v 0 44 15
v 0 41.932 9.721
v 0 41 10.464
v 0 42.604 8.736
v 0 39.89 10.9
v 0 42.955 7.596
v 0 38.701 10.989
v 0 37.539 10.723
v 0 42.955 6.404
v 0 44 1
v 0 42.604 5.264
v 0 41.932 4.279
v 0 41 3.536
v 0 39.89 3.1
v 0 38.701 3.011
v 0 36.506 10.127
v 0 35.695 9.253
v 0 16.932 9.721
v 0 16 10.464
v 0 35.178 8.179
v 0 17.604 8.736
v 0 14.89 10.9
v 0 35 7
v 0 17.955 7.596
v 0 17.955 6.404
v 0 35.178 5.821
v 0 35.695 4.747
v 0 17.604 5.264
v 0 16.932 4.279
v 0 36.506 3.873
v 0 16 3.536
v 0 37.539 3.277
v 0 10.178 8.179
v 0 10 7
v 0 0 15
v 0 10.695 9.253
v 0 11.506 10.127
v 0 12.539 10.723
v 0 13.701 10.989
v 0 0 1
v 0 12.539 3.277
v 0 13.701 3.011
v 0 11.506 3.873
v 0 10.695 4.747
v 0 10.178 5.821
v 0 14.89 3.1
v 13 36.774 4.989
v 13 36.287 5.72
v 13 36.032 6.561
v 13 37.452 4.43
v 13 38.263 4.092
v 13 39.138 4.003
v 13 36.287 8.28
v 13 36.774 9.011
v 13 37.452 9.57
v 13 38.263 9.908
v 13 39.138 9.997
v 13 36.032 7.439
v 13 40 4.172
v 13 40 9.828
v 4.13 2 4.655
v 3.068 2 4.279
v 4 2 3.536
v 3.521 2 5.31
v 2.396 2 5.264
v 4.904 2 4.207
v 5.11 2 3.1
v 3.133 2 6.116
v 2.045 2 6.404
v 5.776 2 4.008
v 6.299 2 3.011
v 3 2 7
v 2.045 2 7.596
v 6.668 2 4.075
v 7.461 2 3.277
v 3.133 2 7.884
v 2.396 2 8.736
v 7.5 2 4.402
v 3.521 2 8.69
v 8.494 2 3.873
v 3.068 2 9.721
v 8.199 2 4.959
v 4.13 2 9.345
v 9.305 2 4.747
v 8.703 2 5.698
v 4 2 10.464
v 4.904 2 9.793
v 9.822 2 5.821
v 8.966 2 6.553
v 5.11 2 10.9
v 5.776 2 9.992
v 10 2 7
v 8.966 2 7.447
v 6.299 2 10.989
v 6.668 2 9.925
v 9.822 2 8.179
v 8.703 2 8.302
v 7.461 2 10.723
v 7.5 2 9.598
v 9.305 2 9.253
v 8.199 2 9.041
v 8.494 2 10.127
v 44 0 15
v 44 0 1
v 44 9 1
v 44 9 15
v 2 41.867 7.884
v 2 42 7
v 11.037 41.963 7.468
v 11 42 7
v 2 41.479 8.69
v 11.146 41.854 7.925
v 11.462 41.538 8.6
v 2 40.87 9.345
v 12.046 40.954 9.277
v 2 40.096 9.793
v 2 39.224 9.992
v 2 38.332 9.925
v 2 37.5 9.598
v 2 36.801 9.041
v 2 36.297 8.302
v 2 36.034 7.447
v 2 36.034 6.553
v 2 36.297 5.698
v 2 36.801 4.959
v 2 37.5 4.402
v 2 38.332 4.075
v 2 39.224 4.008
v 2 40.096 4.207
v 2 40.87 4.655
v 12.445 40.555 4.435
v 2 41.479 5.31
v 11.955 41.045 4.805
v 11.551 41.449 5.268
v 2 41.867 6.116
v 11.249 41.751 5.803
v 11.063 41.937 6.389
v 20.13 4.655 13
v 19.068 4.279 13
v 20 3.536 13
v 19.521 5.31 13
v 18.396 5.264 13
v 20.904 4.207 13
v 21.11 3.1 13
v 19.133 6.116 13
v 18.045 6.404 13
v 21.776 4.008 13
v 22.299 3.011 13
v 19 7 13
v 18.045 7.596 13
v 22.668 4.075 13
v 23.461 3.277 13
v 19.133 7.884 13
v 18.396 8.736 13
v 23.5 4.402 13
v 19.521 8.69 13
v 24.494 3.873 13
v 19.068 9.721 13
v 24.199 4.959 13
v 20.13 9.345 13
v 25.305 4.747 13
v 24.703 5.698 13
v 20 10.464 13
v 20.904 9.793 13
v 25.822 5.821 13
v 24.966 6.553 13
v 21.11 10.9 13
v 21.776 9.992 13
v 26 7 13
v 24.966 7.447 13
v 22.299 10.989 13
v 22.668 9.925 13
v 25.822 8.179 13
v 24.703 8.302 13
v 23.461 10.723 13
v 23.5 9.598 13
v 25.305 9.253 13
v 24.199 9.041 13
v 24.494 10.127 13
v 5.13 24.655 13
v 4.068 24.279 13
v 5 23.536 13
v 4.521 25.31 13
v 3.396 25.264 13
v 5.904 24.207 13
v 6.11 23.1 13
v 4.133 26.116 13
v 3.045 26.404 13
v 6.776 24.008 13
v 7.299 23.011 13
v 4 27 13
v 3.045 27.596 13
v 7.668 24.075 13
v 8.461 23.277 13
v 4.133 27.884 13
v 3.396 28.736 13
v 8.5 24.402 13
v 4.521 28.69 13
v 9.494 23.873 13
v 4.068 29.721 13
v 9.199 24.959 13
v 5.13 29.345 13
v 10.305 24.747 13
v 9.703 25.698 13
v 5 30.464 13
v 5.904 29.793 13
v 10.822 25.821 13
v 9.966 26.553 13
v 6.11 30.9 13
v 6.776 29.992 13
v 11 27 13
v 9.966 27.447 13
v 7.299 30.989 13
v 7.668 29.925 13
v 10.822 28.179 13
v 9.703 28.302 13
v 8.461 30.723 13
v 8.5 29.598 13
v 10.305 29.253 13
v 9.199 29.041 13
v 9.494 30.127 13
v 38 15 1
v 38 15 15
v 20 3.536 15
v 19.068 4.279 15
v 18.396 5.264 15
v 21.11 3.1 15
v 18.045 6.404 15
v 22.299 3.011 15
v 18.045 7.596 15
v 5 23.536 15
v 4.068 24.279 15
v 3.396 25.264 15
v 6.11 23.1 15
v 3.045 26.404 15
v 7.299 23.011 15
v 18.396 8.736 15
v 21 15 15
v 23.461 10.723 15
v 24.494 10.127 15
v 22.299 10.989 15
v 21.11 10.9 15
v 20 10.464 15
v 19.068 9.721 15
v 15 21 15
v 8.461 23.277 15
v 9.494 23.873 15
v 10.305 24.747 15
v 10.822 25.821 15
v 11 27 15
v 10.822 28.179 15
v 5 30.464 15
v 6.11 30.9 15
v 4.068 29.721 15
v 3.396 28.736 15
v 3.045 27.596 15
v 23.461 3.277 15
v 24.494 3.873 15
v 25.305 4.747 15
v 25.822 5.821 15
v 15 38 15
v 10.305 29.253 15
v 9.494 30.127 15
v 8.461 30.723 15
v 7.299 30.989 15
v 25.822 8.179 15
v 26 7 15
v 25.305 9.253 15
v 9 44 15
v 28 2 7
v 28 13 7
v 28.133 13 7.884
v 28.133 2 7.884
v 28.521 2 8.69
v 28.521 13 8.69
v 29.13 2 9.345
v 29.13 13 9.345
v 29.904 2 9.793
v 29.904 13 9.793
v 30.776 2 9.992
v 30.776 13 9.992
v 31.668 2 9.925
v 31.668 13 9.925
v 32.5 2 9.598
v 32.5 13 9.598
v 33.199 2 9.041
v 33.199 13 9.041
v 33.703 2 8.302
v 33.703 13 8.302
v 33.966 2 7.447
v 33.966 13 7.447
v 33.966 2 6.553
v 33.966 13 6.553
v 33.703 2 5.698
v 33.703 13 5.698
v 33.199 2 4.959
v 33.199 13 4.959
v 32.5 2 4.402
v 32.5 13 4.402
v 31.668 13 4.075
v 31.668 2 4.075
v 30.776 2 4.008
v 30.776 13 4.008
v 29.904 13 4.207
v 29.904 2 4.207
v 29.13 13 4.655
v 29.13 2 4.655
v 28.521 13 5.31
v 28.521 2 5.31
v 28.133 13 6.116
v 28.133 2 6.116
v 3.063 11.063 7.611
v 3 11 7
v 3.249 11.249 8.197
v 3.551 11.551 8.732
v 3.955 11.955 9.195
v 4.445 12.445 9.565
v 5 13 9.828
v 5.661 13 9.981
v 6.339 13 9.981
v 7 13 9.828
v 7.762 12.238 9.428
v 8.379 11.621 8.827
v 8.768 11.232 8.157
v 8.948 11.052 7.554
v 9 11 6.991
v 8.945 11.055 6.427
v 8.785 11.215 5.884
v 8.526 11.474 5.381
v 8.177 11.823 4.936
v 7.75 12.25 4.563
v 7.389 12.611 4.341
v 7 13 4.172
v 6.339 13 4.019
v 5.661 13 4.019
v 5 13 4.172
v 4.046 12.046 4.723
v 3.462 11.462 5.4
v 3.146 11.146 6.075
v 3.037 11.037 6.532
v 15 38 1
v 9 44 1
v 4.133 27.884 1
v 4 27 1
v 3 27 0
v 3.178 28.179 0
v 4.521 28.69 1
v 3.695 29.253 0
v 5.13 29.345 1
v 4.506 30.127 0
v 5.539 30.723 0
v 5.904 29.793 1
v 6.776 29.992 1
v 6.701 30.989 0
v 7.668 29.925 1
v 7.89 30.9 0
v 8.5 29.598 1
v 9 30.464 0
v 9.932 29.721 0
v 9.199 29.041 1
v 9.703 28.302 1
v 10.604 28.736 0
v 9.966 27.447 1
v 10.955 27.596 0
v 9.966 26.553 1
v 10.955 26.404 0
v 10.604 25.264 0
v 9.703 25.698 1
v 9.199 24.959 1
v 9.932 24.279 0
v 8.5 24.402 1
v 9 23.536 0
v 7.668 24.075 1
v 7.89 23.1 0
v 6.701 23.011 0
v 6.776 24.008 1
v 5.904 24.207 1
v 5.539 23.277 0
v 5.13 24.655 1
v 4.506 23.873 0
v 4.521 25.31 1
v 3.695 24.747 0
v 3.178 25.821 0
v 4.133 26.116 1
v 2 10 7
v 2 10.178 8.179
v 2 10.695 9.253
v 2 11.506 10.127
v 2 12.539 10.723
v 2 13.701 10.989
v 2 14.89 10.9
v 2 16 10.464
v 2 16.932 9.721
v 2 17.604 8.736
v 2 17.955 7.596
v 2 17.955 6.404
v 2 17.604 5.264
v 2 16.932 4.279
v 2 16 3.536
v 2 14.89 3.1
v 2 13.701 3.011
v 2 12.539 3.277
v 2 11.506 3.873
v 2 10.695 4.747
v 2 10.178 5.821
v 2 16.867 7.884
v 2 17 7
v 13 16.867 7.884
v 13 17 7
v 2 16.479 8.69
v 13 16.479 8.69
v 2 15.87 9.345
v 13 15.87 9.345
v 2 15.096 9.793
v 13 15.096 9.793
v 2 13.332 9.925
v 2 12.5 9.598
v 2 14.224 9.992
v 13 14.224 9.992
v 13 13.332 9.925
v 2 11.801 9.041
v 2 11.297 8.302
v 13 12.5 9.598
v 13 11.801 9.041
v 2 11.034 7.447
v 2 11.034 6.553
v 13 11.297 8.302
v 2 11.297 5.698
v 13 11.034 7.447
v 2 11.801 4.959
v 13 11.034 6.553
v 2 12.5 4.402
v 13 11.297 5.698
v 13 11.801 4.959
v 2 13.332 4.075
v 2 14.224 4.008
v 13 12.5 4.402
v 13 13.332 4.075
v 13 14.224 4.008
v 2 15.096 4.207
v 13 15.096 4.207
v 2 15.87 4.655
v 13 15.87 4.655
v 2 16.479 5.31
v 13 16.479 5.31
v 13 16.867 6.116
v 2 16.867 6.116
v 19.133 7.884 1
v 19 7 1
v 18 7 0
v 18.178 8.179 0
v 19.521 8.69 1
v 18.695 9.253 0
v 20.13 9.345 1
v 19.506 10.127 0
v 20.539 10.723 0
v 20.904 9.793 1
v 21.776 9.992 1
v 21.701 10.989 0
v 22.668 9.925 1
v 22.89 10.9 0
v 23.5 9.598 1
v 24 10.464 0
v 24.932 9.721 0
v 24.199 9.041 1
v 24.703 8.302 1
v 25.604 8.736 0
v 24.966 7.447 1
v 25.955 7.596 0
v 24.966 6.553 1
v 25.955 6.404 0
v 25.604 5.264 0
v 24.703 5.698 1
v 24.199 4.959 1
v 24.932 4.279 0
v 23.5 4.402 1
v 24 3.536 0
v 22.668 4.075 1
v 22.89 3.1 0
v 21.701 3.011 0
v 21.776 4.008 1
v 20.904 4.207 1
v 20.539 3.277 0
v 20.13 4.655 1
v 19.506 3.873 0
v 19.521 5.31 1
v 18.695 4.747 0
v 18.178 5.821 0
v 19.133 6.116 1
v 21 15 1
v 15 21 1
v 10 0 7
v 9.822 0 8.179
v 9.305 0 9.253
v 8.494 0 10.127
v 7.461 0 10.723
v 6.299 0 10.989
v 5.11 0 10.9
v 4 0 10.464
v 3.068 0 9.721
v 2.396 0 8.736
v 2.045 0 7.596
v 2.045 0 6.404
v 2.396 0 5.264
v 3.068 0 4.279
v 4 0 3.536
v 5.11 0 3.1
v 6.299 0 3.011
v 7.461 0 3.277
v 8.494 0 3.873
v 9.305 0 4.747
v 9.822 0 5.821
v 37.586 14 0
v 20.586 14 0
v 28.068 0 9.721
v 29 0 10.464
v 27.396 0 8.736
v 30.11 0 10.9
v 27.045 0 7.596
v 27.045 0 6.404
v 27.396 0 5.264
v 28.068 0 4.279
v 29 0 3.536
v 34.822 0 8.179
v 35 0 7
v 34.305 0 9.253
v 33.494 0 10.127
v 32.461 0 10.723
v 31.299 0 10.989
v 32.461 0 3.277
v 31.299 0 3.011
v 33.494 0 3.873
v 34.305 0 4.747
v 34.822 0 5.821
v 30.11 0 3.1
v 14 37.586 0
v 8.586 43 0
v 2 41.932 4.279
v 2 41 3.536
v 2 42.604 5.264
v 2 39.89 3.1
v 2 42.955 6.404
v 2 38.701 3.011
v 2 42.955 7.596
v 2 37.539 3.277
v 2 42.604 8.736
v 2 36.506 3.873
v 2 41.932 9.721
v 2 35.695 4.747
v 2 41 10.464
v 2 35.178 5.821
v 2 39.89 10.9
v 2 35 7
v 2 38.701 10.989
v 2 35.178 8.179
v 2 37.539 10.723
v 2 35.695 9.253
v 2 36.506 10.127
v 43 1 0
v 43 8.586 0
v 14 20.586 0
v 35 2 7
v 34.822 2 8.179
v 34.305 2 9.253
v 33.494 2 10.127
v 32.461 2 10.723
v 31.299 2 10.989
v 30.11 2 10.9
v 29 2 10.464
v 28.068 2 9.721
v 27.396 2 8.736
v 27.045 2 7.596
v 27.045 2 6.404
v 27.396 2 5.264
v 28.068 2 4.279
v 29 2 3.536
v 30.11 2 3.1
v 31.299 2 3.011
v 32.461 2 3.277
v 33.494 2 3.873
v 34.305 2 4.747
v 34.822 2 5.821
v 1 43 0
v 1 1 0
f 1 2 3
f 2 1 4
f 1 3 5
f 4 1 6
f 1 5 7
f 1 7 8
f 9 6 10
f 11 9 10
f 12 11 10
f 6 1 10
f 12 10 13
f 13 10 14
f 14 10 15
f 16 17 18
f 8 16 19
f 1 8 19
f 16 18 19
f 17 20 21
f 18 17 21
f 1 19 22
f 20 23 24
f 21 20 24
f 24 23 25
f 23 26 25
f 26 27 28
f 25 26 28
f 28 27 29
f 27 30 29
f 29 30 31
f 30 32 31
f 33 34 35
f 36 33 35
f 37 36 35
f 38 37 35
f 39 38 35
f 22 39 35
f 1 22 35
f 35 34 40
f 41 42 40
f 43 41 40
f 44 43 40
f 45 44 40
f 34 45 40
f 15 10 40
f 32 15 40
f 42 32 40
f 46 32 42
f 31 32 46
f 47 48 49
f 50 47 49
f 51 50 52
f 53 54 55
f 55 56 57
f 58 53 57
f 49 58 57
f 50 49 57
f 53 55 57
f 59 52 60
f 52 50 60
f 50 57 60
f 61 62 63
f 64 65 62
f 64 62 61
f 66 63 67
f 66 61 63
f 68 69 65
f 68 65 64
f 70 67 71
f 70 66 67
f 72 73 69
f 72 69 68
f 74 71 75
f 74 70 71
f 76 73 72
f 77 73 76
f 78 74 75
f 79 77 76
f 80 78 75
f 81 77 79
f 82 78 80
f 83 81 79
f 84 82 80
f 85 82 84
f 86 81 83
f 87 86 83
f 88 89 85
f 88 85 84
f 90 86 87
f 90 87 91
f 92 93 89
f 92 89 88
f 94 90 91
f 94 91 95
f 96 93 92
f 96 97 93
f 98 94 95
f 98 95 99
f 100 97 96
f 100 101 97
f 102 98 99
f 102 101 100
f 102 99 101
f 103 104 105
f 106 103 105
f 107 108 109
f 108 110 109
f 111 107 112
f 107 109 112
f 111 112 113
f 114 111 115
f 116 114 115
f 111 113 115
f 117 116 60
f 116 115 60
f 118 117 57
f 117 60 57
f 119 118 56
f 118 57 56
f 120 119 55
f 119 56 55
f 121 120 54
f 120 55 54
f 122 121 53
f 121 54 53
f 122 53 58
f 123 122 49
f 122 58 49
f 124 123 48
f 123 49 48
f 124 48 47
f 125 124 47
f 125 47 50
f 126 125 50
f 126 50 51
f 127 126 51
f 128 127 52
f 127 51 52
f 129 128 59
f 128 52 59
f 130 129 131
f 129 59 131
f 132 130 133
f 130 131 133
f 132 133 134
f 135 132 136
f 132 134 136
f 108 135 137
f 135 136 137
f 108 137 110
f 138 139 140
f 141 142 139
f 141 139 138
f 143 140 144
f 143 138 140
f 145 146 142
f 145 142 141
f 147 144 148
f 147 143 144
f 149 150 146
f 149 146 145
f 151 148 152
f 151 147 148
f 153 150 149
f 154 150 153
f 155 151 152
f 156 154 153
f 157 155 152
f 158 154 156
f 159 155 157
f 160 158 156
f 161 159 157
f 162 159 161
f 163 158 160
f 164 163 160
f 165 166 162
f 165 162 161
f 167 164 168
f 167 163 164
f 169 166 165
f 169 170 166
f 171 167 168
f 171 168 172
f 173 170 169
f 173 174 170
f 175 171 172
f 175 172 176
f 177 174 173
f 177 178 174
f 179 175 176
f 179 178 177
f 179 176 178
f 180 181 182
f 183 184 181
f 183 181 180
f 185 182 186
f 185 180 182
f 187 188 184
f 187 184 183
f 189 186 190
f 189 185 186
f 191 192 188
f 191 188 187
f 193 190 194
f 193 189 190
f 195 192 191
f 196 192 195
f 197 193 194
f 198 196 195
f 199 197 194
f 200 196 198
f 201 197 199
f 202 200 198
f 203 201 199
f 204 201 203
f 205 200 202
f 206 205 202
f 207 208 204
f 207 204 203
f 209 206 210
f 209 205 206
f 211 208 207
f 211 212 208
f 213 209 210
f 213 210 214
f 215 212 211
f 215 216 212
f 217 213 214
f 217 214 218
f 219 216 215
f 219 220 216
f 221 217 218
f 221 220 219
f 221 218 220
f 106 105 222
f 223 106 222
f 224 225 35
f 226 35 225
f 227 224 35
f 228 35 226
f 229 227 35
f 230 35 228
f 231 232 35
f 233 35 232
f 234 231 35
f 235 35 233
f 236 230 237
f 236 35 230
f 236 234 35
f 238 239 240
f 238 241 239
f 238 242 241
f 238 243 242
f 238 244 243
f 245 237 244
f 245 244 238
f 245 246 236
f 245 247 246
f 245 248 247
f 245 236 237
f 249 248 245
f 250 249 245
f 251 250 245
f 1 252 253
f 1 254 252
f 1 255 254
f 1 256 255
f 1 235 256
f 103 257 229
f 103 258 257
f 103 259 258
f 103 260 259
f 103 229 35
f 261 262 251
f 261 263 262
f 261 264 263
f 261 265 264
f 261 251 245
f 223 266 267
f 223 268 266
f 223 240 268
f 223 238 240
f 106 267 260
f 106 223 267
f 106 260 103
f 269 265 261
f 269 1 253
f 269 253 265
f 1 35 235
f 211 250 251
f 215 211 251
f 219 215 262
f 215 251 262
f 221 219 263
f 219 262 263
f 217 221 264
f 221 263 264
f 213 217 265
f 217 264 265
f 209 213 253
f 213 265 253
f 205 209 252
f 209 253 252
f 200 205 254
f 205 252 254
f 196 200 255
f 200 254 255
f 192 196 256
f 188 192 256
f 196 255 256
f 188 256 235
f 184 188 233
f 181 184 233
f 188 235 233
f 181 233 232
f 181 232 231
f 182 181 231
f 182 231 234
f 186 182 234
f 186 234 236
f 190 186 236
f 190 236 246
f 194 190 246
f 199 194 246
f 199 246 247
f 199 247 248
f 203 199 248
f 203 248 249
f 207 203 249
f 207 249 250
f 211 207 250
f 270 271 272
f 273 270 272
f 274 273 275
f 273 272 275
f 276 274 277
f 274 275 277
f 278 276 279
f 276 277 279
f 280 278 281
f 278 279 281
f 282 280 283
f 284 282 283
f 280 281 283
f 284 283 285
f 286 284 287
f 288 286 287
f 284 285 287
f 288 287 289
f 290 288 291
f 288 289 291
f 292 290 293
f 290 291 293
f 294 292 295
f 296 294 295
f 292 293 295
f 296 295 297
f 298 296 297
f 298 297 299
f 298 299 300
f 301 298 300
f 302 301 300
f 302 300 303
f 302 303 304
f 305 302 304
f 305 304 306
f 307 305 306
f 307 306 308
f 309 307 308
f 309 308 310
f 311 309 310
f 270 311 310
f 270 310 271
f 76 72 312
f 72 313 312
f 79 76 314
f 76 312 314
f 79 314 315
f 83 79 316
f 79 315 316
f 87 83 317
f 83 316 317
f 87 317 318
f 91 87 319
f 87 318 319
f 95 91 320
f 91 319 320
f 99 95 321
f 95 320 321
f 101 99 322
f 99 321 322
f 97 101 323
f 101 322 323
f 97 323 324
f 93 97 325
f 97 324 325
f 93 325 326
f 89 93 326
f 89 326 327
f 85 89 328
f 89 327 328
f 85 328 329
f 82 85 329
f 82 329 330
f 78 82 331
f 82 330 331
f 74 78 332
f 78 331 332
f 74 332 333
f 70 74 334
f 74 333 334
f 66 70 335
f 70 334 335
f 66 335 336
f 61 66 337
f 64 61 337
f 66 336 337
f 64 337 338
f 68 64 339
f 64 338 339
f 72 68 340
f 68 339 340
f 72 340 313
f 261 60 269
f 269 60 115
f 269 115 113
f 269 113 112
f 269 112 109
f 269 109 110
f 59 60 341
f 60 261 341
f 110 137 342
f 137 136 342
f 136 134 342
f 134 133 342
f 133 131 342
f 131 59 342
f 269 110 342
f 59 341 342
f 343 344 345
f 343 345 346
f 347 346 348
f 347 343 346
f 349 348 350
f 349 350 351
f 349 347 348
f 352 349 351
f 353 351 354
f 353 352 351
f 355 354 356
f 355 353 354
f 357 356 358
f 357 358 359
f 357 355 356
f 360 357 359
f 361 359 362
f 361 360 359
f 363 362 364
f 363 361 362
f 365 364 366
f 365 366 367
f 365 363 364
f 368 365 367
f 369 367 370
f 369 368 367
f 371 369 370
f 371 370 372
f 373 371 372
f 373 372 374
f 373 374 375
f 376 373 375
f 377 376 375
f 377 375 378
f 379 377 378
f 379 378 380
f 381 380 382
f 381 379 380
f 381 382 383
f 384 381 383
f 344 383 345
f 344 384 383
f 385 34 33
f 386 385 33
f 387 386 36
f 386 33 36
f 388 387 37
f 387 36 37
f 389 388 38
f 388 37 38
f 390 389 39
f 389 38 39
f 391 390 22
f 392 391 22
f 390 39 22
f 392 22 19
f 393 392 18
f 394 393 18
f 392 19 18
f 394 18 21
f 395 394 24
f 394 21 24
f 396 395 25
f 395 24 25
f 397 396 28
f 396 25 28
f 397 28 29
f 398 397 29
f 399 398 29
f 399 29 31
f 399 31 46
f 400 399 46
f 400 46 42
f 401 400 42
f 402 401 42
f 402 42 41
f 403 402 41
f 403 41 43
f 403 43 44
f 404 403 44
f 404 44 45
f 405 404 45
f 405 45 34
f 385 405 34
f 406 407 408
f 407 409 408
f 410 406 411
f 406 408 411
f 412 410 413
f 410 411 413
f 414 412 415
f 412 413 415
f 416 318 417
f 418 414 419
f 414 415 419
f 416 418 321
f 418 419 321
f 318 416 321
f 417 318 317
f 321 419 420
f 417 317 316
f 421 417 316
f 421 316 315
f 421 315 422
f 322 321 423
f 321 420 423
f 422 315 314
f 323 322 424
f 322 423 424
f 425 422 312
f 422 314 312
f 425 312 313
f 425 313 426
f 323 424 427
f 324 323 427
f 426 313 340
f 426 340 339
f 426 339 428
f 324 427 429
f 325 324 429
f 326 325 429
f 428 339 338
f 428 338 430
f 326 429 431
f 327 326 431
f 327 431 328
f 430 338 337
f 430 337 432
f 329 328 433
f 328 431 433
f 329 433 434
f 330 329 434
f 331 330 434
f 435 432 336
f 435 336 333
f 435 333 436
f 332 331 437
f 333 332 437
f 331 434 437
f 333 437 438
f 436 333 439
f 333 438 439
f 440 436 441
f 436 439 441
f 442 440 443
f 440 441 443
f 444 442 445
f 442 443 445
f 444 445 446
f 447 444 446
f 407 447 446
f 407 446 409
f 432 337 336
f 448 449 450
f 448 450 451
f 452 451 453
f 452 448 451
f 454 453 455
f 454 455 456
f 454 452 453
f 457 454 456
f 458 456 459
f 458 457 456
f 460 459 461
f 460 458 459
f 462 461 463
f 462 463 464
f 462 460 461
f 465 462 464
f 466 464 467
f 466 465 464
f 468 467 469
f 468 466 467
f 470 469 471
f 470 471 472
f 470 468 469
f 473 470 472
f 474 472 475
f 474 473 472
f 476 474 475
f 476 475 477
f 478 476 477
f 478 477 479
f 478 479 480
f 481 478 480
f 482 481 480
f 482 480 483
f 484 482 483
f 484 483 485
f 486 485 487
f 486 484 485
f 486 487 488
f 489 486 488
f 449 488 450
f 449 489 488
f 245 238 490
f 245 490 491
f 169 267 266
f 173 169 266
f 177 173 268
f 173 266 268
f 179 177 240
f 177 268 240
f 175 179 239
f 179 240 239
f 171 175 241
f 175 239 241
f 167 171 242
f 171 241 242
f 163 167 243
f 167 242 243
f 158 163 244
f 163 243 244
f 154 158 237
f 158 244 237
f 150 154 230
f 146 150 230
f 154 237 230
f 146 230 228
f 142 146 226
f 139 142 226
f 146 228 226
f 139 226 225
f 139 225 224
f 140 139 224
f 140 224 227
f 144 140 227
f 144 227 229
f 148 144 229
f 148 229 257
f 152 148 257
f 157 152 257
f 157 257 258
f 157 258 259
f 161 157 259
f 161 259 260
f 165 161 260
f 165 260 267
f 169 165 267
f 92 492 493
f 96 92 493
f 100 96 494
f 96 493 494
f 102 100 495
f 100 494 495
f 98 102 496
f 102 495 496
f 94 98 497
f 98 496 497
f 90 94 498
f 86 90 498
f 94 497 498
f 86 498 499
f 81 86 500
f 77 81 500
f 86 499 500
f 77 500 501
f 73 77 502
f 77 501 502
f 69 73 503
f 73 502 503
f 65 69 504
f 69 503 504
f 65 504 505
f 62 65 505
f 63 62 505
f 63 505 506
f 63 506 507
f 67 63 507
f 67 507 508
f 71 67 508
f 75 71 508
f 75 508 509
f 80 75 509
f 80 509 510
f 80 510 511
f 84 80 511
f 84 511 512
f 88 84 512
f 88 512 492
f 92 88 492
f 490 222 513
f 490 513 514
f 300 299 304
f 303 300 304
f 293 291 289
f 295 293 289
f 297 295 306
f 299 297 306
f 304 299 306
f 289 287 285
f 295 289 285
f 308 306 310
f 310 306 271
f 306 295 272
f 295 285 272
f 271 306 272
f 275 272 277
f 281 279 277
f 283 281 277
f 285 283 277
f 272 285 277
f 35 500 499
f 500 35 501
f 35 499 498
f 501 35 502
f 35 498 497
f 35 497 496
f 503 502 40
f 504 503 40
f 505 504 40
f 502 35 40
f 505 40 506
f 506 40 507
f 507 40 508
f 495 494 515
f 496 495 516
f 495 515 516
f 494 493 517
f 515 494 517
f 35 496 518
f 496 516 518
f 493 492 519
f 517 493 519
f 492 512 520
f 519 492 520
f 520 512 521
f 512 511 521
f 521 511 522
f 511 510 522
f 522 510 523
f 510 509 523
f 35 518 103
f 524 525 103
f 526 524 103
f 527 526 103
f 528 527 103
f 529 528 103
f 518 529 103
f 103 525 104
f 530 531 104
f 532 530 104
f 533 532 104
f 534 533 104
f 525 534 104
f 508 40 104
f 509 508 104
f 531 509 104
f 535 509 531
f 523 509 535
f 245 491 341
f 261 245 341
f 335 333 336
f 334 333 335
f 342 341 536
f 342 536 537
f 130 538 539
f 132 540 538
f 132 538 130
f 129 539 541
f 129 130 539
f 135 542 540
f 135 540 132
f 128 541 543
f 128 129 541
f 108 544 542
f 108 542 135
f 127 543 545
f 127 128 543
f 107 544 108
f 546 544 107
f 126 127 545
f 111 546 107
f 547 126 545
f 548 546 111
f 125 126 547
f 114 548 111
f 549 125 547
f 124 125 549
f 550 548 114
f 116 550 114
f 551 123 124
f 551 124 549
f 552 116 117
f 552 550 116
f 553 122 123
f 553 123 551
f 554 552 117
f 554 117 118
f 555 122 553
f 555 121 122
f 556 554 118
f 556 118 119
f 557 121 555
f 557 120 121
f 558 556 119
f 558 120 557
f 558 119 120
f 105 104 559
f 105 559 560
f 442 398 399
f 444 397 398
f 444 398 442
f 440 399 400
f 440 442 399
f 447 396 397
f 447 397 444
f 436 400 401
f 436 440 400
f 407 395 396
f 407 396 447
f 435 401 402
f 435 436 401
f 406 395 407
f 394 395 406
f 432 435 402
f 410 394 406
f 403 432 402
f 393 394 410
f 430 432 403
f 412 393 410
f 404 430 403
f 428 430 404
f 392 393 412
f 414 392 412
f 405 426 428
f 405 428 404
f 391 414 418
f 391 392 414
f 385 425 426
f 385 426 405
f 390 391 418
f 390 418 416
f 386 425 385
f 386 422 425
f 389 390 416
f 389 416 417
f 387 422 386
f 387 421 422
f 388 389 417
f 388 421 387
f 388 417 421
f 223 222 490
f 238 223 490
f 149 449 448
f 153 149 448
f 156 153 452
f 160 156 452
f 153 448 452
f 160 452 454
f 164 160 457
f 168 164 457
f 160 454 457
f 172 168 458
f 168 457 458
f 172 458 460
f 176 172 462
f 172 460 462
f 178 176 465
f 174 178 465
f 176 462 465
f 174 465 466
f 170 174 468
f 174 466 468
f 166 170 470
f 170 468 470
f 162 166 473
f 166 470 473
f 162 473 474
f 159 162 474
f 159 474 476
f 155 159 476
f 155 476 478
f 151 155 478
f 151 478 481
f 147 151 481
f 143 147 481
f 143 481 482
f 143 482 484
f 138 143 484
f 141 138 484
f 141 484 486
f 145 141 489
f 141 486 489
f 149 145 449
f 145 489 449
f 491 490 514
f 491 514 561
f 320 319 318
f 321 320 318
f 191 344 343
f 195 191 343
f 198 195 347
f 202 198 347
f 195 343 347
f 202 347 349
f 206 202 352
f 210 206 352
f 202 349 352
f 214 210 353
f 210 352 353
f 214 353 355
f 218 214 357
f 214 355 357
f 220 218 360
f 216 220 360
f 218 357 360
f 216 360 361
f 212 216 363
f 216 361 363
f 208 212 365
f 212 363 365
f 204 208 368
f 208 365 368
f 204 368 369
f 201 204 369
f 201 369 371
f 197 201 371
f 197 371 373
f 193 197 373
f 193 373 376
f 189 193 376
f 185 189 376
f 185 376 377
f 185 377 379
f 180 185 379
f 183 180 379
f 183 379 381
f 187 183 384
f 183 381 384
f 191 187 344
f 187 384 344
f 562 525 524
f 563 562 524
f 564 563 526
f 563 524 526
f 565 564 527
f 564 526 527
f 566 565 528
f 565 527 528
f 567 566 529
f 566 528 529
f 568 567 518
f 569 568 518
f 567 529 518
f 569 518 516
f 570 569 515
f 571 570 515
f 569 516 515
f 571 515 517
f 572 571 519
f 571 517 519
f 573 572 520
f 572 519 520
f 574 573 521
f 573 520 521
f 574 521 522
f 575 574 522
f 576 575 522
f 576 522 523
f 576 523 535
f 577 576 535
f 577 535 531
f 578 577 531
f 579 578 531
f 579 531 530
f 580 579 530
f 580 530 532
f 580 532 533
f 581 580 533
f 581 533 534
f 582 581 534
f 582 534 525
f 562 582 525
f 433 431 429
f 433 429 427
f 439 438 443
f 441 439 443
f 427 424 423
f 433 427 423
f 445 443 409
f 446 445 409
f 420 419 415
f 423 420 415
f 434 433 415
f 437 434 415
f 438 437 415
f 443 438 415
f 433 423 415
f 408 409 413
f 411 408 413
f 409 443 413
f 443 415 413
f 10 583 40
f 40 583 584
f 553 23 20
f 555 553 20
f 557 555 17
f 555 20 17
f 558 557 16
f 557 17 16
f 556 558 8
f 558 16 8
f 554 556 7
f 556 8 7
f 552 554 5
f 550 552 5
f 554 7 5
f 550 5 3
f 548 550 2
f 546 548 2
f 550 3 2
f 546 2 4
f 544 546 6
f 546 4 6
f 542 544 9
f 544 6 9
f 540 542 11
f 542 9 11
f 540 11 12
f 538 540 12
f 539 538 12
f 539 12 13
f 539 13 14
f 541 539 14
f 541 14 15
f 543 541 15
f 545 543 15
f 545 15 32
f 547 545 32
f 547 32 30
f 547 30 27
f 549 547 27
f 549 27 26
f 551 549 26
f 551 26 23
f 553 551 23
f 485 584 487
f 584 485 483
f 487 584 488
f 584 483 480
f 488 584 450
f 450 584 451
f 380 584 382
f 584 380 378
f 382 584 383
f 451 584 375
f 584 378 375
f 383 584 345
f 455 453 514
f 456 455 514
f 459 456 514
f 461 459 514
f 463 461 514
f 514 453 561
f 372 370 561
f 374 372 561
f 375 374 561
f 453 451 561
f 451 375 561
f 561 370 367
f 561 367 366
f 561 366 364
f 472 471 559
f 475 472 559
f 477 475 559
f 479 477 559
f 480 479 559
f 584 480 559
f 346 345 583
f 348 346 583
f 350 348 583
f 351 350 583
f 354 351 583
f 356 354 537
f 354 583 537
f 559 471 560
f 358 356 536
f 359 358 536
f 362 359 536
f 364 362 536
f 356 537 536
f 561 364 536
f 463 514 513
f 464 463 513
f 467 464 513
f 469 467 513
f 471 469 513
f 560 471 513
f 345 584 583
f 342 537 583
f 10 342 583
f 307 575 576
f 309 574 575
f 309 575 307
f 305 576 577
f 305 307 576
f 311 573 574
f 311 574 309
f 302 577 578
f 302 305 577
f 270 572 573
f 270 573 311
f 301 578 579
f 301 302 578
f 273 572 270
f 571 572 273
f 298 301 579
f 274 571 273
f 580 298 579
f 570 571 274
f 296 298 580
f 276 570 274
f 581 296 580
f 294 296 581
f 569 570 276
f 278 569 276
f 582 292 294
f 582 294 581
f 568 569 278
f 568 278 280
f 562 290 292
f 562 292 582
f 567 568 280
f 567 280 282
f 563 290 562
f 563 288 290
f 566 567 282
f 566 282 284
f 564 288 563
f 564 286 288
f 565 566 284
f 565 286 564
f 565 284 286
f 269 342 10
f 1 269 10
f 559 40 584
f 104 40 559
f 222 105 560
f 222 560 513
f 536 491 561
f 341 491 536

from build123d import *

# Parameters (mm, degrees)
PAD_DEPTH           = 15
HOLE_D              = 6
HOLE_DEPTH          = 25
HOLE_CBORE_D        = 8
HOLE_CBORE_DEPTH    = 2
HOLE001_D           = 6
HOLE001_DEPTH       = 13
HOLE001_CBORE_D     = 8
HOLE001_CBORE_DEPTH = 2
HOLE002_D           = 6
HOLE002_DEPTH       = 13
HOLE002_CBORE_D     = 8
HOLE002_CBORE_DEPTH = 2
CHAMFER_SIZE        = 1


with BuildPart() as part:
    # Sketch → Pad (new body)
    with BuildSketch(Plane.XY):
        Polygon((0, 44), (0, 0), (44, 0), (44, 9), (38, 15), (21, 15), (15, 21), (15, 38), (9, 44), align=None)
    extrude(amount=PAD_DEPTH)

    # Hole
    with Locations(Plane.XY.offset(15)):
        with Locations((22, 7), (7, 27)):
            CounterBoreHole(HOLE_D / 2, HOLE_CBORE_D / 2, HOLE_CBORE_DEPTH, depth=HOLE_DEPTH)

    # Hole001
    with Locations(Plane.XZ):
        with Locations((6, 7), (31, 7)):
            CounterBoreHole(HOLE001_D / 2, HOLE001_CBORE_D / 2, HOLE001_CBORE_DEPTH, depth=HOLE001_DEPTH)

    # Hole002
    with Locations(Plane(origin=(0, 0, 0), x_dir=(0, -1, 0), z_dir=(-1, 0, 0))):
        with Locations((-14, 7), (-39, 7)):
            CounterBoreHole(HOLE002_D / 2, HOLE002_CBORE_D / 2, HOLE002_CBORE_DEPTH, depth=HOLE002_DEPTH)

    # Chamfer
    chamfer_edges = [part.edges().sort_by_distance(p)[0] for p in [
        (12, 41, 0),
        (15, 29.5, 0),
        (4.5, 44, 0),
        (18, 18, 0),
        (0, 22, 0),
        (29.5, 15, 0),
        (22, 0, 0),
        (41, 12, 0),
        (44, 4.5, 0),
        (4, 27, 0),
        (19, 7, 0),
    ]]
    chamfer(chamfer_edges, length=CHAMFER_SIZE)


solid = part.part
